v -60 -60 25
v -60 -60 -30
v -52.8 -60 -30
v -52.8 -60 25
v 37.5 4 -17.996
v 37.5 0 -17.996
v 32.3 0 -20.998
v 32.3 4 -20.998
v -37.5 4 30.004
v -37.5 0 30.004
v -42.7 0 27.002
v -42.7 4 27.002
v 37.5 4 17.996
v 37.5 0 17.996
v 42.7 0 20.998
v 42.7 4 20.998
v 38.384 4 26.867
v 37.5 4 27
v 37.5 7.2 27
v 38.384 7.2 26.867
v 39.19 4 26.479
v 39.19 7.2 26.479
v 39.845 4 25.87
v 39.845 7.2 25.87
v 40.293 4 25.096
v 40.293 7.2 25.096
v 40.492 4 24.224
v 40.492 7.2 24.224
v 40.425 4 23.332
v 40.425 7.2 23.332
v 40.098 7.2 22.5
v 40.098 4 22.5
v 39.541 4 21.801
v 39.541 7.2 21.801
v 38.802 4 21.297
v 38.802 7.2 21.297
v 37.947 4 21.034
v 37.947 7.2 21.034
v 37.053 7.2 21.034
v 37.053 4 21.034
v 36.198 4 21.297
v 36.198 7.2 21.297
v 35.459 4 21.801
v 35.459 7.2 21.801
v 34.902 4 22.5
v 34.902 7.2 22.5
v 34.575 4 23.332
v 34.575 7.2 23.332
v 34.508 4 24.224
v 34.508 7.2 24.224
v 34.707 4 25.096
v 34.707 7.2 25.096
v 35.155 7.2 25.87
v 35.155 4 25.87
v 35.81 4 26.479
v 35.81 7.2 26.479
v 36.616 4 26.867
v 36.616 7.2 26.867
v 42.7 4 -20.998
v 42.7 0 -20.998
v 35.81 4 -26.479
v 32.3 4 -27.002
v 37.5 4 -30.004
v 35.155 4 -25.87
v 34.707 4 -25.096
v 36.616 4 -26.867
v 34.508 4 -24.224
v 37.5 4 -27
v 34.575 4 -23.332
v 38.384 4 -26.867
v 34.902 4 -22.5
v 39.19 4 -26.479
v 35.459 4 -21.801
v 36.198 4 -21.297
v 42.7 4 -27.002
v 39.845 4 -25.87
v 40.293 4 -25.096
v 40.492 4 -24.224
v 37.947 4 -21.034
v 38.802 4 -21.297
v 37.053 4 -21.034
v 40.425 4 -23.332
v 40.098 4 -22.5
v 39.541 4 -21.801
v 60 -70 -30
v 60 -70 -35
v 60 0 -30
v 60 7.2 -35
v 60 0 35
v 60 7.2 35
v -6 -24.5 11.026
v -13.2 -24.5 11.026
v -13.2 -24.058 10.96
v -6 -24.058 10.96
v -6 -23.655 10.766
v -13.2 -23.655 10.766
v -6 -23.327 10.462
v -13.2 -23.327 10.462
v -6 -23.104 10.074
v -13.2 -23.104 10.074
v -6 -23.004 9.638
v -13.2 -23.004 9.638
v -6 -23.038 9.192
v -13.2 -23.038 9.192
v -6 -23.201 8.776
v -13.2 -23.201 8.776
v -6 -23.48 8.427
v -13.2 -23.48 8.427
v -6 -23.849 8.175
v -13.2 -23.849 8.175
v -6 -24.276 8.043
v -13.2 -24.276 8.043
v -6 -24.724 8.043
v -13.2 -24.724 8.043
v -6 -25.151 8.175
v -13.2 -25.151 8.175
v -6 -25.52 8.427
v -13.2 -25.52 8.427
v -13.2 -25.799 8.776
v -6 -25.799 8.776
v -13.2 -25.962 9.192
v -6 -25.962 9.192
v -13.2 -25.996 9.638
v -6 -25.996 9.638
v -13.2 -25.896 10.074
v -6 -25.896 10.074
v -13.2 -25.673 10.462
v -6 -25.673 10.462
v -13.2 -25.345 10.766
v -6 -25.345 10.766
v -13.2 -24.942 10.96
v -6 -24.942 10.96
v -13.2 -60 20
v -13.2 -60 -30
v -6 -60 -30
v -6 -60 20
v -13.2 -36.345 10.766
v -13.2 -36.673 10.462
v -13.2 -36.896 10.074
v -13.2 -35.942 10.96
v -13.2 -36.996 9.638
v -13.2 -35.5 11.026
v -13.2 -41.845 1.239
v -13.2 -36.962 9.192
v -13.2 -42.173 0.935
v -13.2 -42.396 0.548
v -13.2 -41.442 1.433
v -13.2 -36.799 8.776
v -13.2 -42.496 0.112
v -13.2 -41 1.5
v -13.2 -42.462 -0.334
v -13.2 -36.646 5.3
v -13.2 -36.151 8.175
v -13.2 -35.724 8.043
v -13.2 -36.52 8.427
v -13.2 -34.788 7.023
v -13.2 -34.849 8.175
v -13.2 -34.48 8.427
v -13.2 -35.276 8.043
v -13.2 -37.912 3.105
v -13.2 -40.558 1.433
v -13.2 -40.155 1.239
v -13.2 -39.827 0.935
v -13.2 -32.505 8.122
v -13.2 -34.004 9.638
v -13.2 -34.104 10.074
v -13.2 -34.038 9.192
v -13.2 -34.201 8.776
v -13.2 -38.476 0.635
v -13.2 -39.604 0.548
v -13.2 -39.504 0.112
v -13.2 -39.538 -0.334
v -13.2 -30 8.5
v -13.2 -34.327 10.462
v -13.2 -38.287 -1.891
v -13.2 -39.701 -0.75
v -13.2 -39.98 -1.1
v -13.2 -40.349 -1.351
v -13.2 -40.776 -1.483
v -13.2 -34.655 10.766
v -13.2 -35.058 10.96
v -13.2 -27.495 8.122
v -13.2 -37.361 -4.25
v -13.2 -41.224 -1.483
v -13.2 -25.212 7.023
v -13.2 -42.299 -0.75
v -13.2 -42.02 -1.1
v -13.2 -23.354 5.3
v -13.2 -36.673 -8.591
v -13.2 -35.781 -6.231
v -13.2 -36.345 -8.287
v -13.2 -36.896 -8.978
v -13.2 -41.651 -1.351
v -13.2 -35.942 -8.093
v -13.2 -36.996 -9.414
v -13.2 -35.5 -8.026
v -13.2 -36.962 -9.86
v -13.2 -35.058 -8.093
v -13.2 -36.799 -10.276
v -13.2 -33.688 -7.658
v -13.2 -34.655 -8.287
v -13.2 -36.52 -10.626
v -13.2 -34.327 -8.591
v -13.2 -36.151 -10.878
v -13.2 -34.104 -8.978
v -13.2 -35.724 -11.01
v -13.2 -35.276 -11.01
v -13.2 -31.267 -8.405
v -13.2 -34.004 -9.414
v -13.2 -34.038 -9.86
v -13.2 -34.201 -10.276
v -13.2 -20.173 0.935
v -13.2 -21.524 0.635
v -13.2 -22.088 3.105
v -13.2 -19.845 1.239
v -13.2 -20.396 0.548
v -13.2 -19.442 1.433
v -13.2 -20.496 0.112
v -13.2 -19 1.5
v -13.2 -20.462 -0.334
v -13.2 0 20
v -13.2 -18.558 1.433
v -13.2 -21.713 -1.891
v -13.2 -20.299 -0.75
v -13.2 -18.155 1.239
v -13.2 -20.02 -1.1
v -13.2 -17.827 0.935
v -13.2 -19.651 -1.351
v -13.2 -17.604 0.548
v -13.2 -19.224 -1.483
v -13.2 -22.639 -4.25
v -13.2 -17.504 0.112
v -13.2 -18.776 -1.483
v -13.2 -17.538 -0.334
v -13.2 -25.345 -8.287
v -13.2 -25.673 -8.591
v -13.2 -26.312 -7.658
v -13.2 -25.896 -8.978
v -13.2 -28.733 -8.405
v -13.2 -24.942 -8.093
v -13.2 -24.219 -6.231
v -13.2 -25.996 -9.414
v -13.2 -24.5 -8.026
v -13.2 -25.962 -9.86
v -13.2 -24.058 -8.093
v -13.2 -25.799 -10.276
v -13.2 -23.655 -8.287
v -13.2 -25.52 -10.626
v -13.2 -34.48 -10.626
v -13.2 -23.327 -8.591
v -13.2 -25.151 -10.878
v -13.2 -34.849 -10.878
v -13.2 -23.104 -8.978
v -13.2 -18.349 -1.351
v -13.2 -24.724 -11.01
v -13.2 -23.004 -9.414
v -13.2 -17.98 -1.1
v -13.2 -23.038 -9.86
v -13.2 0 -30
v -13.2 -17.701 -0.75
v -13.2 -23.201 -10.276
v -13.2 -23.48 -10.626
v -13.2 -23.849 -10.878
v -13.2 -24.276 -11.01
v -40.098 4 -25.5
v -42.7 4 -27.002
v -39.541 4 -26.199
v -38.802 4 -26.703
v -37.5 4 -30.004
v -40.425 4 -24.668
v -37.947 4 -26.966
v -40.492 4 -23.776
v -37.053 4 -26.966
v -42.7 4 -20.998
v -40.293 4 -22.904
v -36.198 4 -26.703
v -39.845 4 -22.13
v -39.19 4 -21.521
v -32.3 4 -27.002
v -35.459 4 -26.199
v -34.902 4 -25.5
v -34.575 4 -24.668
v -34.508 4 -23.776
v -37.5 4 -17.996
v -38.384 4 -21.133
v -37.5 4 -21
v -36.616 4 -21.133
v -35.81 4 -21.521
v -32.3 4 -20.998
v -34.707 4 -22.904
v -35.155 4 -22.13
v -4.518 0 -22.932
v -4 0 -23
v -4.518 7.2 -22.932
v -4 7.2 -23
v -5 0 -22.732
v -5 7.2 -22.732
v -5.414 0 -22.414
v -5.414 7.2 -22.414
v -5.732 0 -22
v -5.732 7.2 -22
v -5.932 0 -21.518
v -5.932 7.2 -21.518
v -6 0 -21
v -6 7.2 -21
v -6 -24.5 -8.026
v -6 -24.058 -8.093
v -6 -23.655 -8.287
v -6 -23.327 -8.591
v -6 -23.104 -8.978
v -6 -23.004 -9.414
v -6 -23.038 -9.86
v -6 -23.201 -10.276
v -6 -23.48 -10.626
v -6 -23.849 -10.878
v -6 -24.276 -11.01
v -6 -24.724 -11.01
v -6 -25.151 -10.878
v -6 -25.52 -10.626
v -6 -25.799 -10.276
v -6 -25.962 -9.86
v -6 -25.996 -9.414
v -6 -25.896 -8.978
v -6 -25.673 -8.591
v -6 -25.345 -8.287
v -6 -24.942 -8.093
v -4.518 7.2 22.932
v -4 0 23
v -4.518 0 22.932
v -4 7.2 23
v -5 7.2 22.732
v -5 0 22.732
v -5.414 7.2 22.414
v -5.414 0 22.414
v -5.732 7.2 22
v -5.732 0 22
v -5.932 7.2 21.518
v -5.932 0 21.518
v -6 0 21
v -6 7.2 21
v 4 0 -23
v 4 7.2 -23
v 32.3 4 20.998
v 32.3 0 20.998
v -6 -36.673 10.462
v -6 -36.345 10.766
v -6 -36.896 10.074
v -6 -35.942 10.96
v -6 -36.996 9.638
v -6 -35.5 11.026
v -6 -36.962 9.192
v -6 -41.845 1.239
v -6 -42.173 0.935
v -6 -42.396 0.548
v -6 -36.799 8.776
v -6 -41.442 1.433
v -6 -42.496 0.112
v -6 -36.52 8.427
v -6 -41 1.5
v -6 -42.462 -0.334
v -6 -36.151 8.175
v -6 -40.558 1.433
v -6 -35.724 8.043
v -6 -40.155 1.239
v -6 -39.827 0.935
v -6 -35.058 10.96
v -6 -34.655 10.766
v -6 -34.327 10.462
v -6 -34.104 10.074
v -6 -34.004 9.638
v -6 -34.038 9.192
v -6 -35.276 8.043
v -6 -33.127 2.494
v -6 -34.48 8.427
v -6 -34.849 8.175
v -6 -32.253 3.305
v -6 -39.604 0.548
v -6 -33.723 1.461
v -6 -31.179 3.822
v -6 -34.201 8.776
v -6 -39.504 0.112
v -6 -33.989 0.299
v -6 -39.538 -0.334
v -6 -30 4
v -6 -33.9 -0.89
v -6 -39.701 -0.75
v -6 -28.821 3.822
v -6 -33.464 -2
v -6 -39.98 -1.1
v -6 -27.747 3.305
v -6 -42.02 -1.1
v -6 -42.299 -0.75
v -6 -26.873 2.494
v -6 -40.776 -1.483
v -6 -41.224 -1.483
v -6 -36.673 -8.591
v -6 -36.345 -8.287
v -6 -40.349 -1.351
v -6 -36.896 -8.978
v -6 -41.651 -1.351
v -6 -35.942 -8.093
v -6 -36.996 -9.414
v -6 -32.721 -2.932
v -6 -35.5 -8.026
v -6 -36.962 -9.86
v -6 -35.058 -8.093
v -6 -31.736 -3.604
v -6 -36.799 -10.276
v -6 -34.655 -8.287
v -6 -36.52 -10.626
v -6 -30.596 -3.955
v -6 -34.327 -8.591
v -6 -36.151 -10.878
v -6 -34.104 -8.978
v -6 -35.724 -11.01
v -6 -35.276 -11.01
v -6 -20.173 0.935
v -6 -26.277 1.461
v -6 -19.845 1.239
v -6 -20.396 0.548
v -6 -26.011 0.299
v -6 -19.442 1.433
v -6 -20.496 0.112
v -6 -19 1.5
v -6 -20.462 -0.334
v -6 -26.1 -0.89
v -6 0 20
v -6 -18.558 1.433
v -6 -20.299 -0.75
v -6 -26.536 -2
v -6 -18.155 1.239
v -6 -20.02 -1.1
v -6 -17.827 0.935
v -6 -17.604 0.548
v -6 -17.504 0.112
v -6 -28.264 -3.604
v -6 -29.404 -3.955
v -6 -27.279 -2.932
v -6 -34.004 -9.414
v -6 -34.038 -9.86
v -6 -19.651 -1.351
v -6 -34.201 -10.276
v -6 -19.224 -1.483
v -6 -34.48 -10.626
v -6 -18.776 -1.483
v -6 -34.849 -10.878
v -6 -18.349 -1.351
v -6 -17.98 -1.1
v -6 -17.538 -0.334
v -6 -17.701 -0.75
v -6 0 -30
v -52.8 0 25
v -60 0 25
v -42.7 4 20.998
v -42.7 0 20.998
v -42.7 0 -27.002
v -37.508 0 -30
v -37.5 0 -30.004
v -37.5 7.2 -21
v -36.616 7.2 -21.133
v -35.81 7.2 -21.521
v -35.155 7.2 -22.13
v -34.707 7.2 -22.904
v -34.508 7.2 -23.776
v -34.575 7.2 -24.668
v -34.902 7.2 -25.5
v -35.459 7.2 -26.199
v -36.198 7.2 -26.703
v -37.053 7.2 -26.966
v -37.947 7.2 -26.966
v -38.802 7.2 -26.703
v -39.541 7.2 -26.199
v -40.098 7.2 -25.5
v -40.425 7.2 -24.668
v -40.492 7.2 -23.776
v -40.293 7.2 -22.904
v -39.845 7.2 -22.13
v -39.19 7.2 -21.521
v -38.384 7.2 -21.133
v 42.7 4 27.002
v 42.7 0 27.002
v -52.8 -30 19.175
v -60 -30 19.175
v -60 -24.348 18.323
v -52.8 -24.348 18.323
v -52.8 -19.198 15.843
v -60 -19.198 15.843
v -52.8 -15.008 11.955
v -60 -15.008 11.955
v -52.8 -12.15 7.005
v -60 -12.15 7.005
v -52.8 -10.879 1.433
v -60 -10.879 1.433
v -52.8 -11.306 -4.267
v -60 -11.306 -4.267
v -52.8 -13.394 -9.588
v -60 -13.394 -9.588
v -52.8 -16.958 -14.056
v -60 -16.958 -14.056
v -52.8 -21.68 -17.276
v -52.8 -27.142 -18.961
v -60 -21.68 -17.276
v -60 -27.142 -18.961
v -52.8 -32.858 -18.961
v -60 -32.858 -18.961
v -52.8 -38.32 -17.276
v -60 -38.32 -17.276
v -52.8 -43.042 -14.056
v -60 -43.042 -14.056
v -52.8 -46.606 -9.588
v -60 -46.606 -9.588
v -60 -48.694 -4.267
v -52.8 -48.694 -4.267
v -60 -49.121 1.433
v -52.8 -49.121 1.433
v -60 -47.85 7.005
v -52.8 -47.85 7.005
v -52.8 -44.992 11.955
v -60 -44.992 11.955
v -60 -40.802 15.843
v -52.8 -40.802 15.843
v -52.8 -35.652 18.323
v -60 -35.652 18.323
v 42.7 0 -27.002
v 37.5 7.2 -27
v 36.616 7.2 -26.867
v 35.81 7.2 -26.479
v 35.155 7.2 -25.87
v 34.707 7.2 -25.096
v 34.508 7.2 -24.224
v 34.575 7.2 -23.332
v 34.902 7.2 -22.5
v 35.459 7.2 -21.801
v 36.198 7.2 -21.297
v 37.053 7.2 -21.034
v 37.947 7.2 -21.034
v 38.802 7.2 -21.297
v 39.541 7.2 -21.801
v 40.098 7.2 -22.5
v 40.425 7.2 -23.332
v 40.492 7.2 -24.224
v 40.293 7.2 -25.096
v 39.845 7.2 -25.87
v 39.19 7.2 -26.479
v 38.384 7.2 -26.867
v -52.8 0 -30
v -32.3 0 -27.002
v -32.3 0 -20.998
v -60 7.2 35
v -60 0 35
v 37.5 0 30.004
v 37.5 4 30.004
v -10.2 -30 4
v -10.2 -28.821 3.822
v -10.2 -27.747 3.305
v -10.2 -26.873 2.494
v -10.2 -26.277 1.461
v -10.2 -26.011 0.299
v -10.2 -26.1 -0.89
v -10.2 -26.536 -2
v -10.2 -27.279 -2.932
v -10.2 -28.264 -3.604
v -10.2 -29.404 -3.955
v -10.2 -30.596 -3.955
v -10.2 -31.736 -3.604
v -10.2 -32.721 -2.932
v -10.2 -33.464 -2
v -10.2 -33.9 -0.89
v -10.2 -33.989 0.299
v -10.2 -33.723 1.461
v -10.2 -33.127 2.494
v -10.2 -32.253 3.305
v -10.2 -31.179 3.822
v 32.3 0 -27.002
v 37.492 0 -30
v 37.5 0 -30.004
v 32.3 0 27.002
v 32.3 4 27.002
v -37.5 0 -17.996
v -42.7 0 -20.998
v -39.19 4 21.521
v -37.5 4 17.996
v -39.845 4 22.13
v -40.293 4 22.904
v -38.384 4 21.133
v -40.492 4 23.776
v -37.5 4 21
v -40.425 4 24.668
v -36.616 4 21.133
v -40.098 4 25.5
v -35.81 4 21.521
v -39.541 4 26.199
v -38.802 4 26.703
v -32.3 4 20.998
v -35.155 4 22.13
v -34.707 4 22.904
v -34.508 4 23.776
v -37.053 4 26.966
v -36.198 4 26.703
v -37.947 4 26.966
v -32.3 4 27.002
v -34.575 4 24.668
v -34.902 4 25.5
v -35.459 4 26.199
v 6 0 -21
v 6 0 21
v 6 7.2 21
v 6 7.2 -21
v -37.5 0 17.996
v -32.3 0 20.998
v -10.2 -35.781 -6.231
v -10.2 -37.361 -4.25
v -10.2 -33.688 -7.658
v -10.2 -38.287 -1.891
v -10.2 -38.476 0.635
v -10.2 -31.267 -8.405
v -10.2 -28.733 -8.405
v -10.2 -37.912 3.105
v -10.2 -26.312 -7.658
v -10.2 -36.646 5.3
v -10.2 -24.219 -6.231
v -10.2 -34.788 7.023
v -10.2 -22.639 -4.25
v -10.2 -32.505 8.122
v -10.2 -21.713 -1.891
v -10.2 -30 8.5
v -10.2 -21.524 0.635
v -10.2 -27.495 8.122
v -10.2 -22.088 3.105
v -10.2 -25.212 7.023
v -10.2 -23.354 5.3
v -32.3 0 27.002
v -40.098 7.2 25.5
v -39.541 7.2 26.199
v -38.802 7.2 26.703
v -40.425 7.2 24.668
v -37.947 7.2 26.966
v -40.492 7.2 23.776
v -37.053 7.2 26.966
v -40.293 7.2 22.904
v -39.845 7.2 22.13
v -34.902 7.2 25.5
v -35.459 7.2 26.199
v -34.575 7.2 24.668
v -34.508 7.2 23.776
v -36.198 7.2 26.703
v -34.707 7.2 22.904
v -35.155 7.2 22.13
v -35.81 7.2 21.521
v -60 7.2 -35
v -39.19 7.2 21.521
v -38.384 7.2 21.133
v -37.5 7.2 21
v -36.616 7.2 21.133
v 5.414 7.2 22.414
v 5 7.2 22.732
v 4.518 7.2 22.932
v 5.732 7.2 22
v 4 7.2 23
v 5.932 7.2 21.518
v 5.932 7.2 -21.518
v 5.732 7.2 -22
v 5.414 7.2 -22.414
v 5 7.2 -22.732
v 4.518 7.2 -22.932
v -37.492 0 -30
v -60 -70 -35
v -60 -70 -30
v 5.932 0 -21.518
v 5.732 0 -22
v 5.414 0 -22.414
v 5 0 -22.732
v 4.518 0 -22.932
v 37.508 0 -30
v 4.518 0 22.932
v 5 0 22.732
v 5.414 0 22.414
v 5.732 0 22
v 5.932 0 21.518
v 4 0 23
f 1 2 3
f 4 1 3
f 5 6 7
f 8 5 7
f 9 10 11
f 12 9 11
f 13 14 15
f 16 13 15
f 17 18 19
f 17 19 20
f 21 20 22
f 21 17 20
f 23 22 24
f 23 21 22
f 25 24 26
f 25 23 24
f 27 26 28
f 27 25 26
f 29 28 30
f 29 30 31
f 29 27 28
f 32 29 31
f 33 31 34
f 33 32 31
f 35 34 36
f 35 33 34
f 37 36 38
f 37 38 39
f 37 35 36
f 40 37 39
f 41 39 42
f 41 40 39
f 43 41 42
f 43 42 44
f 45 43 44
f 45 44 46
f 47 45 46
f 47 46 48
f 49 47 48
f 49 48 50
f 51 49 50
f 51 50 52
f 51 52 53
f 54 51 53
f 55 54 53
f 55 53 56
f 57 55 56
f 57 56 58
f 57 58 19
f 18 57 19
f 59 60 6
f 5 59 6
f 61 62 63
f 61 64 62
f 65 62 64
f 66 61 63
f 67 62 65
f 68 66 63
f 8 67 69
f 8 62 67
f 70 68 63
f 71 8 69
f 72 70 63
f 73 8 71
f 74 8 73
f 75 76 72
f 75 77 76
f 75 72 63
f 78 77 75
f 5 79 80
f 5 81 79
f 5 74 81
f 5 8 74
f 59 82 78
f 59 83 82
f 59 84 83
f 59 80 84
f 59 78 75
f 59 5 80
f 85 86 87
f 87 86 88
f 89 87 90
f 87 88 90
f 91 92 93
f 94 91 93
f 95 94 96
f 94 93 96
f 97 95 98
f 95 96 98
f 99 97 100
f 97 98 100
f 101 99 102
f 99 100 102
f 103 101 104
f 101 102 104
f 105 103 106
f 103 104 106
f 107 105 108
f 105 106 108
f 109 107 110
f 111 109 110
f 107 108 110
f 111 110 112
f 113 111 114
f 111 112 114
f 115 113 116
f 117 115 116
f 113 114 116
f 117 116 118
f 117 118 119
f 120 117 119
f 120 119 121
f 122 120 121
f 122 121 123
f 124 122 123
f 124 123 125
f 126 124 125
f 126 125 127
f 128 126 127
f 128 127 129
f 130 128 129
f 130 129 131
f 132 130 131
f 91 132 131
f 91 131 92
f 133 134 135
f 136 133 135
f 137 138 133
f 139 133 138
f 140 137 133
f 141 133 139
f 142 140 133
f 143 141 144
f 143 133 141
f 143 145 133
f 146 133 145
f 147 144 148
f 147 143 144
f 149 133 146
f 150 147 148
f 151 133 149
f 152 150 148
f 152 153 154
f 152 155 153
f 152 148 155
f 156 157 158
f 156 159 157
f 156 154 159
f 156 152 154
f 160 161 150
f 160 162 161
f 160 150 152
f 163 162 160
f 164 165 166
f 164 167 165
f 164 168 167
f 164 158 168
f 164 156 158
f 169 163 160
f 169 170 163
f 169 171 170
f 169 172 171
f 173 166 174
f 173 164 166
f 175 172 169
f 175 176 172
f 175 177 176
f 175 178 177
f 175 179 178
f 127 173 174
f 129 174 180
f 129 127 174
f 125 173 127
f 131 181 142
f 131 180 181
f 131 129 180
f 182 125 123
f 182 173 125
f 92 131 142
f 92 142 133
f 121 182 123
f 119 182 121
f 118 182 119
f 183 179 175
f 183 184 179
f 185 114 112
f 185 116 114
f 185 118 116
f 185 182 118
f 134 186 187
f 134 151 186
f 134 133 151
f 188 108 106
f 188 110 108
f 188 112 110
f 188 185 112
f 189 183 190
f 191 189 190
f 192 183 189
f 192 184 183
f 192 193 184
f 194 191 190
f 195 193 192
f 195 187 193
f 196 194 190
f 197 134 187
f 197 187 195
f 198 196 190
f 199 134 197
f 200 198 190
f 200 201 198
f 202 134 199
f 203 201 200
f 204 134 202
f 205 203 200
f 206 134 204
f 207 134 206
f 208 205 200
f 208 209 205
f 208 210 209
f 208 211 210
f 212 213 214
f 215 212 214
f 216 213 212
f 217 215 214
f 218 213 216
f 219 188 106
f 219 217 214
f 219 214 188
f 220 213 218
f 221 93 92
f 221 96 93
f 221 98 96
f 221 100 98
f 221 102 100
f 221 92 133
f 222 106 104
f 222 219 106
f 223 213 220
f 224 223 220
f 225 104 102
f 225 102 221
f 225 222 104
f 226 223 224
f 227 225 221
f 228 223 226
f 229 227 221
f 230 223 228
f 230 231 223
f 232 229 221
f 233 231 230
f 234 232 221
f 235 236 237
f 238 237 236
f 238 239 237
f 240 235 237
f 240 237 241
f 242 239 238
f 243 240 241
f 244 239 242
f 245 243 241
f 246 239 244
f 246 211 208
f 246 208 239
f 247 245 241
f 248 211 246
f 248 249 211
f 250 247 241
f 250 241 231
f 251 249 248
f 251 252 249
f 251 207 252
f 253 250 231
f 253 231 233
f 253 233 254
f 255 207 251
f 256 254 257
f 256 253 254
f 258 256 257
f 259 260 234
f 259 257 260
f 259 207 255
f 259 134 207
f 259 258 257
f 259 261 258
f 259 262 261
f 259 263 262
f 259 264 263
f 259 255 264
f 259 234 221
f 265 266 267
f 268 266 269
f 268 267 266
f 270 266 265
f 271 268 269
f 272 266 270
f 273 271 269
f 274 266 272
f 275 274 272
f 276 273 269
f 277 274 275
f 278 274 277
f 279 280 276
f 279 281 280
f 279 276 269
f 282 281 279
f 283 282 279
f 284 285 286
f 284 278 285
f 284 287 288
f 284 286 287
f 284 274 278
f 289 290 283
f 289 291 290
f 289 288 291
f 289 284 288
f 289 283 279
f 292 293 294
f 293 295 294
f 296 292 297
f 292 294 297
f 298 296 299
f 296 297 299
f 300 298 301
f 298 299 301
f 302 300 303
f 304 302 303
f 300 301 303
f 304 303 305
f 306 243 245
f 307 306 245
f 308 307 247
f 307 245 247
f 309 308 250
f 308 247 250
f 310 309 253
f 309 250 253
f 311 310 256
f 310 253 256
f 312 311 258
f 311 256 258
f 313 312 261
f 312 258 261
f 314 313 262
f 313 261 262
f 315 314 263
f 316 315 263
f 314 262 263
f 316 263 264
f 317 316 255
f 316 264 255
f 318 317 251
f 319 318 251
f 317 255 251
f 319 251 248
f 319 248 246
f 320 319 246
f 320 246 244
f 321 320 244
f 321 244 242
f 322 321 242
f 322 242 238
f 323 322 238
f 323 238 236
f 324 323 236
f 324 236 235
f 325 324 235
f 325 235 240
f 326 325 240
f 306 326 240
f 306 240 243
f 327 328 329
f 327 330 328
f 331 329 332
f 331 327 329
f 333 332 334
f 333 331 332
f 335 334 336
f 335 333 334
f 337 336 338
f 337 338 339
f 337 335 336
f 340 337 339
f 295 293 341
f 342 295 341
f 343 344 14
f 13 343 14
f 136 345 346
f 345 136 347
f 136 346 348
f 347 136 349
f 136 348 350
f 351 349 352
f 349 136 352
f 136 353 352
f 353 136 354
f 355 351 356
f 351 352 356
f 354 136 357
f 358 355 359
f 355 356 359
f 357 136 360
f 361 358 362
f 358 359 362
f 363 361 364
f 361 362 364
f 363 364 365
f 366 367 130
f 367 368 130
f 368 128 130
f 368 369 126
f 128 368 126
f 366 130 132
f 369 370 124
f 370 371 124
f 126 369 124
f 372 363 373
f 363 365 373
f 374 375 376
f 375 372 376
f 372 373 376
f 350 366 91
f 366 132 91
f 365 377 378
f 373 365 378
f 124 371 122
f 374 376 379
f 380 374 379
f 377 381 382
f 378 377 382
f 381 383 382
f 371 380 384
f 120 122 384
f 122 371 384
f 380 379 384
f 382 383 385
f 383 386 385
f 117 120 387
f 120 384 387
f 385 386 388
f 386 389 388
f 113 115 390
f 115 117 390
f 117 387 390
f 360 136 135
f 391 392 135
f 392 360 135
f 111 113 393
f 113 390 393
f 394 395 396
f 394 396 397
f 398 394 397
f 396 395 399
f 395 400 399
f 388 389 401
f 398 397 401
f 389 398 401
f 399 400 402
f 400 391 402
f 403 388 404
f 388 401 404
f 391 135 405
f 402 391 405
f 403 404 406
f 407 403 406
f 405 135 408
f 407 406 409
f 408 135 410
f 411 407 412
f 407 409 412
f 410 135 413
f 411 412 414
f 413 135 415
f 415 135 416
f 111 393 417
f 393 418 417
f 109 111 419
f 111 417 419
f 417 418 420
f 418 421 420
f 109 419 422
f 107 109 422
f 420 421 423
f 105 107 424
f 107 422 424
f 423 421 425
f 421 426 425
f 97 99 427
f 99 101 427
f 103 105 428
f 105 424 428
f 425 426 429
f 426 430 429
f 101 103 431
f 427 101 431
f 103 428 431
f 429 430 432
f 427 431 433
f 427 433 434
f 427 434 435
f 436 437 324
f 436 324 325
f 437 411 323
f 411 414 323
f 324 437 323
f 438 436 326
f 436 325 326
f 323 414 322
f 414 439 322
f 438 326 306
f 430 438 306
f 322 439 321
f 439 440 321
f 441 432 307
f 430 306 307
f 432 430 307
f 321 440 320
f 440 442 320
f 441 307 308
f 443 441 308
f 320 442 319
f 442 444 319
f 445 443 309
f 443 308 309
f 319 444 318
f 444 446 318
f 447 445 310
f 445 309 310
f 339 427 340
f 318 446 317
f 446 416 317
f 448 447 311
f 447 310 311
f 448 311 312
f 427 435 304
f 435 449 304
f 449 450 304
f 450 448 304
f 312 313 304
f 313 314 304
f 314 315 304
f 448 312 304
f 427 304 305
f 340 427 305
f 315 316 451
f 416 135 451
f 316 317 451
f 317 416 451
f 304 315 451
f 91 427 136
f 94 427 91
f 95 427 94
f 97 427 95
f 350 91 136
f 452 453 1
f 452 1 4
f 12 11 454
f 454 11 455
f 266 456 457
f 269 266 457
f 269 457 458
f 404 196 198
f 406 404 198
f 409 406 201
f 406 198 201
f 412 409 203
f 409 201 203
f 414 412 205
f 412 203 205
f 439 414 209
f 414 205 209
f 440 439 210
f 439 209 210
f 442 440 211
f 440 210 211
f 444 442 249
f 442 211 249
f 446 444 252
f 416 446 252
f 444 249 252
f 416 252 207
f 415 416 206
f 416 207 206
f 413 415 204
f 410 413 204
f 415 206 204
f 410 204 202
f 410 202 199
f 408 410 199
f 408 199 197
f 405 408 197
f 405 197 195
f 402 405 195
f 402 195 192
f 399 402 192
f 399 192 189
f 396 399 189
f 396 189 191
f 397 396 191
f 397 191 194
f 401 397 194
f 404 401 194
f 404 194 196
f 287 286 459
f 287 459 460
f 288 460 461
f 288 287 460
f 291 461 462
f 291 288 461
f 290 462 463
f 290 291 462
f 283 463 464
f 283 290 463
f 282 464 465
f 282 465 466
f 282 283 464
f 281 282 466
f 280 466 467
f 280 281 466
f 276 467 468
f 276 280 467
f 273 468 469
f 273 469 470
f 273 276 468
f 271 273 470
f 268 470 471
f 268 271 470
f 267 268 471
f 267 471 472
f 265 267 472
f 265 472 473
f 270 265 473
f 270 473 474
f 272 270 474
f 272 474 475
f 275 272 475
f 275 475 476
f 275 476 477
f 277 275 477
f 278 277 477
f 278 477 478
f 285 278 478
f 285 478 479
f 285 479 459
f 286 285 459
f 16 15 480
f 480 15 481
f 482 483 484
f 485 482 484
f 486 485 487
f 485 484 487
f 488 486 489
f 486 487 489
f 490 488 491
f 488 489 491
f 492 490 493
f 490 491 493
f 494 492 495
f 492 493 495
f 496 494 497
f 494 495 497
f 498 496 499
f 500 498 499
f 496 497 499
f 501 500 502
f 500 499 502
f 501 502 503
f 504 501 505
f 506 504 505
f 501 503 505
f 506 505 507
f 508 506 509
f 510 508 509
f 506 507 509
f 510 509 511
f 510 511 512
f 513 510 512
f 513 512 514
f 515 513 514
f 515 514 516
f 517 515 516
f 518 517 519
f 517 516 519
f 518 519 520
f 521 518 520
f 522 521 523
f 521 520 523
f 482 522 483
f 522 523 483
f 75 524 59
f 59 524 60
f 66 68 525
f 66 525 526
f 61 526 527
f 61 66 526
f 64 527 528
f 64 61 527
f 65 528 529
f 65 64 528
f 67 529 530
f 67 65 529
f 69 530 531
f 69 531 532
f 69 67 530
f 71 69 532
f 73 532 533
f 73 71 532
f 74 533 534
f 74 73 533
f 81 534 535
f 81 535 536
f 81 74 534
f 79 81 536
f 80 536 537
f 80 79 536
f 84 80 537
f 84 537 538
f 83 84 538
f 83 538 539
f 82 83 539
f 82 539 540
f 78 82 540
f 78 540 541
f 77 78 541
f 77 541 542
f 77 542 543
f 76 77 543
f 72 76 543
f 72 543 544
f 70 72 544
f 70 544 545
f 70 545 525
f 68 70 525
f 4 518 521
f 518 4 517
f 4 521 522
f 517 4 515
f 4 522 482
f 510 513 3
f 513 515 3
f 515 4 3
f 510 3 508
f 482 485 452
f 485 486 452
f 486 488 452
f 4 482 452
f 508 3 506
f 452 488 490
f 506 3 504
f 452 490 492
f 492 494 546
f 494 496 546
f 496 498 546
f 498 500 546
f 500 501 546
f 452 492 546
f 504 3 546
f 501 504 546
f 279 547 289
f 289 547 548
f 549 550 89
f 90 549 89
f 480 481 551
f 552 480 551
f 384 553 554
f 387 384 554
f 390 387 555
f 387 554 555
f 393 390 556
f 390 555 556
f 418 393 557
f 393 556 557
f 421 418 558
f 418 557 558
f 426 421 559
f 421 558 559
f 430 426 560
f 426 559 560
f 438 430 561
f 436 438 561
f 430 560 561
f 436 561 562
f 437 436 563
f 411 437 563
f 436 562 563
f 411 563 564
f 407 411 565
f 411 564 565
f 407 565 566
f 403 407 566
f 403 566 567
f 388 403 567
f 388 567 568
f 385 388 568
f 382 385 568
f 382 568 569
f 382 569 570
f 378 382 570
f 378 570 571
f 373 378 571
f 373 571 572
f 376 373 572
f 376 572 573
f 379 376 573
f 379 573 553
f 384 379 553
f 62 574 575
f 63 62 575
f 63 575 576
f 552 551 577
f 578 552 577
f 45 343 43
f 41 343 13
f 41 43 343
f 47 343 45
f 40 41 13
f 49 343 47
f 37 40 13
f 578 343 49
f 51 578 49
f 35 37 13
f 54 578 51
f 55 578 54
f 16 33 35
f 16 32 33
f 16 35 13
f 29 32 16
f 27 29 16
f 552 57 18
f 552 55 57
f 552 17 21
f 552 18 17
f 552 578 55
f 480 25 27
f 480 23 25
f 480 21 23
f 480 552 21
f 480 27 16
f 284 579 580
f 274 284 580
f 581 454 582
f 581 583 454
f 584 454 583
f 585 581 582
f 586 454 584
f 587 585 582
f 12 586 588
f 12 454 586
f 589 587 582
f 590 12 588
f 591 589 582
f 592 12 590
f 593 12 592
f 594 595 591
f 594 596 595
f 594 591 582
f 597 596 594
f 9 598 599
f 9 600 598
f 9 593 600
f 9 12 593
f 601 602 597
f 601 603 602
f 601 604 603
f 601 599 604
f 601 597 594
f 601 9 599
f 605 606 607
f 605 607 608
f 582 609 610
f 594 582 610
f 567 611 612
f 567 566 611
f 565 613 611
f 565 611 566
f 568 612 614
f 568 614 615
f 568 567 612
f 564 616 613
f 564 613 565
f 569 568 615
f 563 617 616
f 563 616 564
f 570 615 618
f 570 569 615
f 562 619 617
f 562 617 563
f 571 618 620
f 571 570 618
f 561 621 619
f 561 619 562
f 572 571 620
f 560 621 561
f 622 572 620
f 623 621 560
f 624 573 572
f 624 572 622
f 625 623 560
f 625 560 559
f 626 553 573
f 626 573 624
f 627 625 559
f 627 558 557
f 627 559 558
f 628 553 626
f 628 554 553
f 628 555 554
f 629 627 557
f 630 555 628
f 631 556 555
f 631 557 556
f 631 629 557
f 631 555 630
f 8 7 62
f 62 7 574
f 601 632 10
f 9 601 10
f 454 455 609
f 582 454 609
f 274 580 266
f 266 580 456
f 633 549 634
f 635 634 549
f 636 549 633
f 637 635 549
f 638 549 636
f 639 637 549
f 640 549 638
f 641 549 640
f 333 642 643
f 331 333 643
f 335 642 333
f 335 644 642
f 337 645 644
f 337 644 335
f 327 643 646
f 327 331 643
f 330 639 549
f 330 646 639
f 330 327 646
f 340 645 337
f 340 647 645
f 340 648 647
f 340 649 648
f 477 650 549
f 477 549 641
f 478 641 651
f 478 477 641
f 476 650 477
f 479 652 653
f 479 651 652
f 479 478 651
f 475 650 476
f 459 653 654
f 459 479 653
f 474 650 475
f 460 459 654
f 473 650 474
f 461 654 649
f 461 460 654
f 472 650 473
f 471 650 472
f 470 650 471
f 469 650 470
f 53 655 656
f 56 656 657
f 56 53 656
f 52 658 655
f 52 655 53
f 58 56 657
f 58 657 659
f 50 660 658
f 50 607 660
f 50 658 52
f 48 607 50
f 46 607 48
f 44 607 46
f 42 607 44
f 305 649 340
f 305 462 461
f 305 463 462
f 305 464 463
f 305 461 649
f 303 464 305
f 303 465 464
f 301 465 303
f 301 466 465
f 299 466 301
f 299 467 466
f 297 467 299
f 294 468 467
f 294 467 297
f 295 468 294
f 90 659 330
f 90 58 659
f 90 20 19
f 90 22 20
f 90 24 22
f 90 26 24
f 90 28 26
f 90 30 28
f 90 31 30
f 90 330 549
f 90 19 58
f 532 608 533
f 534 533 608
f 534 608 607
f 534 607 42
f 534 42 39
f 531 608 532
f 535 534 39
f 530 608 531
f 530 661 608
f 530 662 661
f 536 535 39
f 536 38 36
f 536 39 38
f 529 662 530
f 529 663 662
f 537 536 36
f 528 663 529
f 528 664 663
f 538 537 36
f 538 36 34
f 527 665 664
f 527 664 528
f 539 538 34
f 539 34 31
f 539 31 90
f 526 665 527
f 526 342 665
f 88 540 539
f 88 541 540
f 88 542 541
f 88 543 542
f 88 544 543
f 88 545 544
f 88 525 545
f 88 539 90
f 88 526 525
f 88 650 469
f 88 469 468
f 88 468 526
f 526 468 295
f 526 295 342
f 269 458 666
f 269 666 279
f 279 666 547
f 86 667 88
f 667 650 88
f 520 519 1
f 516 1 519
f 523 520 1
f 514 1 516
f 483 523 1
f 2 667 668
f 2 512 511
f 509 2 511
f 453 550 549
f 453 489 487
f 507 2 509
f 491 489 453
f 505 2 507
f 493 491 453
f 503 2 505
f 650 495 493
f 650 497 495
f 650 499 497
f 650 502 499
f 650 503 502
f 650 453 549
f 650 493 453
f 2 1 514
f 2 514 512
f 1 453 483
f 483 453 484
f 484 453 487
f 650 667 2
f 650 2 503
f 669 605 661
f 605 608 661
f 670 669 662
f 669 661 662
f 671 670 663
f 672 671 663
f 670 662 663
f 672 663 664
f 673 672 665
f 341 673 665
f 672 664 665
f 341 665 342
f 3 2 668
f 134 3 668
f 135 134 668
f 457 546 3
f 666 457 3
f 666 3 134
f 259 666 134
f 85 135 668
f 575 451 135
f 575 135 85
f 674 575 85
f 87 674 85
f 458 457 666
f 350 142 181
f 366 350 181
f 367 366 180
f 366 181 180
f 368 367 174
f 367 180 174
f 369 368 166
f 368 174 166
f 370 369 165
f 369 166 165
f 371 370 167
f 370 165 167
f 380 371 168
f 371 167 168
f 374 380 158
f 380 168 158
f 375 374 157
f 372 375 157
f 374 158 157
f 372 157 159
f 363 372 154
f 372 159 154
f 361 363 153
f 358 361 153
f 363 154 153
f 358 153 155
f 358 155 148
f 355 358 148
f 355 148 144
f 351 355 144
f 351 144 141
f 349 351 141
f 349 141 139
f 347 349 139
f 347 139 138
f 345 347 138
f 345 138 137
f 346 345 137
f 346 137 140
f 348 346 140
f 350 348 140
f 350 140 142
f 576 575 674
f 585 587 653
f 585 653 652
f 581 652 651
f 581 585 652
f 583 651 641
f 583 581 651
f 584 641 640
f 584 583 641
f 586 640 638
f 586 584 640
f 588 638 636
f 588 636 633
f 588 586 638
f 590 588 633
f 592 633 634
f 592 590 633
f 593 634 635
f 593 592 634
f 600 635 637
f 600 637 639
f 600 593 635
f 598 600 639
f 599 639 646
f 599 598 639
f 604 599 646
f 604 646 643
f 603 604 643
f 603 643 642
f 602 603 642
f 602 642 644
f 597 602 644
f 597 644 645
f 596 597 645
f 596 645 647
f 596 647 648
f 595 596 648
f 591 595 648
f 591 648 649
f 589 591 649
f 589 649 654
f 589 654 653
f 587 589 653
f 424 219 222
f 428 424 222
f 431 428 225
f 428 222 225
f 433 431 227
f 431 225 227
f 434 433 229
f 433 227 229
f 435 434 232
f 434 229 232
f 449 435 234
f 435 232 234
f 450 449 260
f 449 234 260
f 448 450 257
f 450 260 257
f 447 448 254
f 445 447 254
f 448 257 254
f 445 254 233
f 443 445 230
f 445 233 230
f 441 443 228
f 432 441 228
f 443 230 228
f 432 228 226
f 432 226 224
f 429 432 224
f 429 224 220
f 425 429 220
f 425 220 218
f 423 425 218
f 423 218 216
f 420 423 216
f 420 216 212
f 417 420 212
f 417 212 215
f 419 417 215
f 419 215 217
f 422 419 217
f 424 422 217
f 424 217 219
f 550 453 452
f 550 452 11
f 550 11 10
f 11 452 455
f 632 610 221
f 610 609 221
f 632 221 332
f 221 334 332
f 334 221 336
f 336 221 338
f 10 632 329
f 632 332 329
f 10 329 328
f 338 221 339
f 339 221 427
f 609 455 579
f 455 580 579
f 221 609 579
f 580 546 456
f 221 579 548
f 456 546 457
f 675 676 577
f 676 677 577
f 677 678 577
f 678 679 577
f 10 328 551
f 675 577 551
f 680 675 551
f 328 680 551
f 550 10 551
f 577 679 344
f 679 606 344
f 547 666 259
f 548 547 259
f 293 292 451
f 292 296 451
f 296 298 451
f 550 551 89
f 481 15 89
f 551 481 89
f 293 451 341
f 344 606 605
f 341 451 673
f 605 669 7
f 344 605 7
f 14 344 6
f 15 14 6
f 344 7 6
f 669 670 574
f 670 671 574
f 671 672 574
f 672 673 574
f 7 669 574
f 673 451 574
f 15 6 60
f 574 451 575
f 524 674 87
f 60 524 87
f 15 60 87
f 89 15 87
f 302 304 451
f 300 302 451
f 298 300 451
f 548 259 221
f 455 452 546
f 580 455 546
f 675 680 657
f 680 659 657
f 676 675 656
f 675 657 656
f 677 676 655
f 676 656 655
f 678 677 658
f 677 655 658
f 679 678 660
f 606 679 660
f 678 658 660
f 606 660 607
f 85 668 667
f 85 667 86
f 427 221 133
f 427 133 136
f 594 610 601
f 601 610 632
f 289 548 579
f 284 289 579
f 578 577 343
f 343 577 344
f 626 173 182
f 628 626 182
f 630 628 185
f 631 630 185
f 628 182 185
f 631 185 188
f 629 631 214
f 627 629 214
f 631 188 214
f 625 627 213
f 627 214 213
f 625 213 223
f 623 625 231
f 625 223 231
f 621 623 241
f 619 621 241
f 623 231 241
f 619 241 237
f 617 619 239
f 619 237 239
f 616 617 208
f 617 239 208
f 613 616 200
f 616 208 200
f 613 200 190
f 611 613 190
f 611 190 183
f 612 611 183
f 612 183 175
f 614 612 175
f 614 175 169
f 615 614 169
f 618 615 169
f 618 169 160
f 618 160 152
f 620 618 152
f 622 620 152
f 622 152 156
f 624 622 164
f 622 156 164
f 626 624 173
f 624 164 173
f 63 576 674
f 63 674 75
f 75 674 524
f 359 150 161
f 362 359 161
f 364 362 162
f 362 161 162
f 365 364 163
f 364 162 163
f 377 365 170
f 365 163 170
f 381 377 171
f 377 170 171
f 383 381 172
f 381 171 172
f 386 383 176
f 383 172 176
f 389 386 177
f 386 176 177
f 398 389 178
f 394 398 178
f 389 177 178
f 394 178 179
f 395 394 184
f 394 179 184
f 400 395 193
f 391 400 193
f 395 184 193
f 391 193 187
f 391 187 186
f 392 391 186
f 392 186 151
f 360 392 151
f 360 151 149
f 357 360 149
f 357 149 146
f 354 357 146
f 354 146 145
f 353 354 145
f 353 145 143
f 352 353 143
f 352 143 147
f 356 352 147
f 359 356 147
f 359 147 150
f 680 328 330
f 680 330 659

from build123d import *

# Parameters (mm, degrees)
SKETCH1_W           = 120
SKETCH1_H           = 70
SKETCH1_R           = 3
SKETCH1_W_2         = 12
SKETCH1_H_2         = 46
BOSS_EXTRUDE1_DEPTH = 7.2
FILLET1_R           = 2
SKETCH2_W           = 120
SKETCH2_H           = 5
BOSS_EXTRUDE2_DEPTH = 70
SKETCH3_W           = 7.2
SKETCH3_H           = 60
BOSS_EXTRUDE3_DEPTH = 50
SKETCH4_R           = 4
SKETCH4_R_2         = 1.5
CUT_EXTRUDE1_DEPTH  = 10
SKETCH5_R           = 8.5
CUT_EXTRUDE2_DEPTH  = 3
SKETCH6_W           = 7.2
SKETCH6_H           = 60
BOSS_EXTRUDE4_DEPTH = 55
CUT_EXTRUDE4_DEPTH  = 4
CUT_EXTRUDE5_START  = -60
SKETCH10_R          = 4
CUT_EXTRUDE5_DEPTH  = 60
SKETCH11_R          = 19.175
CUT_EXTRUDE6_DEPTH  = 7.2


with BuildPart() as part:
    # Sketch1 → Boss-Extrude1 (new body)
    with BuildSketch(Plane(origin=(0, 0, 0), x_dir=(1, 0, 0), z_dir=(0, 1, 0))):
        Rectangle(SKETCH1_W, SKETCH1_H)
        with Locations(Location((-37.5, 24, 0), (0, 0, 270))):
            Circle(SKETCH1_R, mode=Mode.SUBTRACT)
        with Locations(Location((-37.5, -24, 0), (0, 0, 90))):
            Circle(SKETCH1_R, mode=Mode.SUBTRACT)
        with Locations(Location((37.5, 24, 0), (0, 0, 90))):
            Circle(SKETCH1_R, mode=Mode.SUBTRACT)
        with Locations(Location((37.5, -24, 0), (0, 0, 270))):
            Circle(SKETCH1_R, mode=Mode.SUBTRACT)
        Rectangle(SKETCH1_W_2, SKETCH1_H_2, mode=Mode.SUBTRACT)
    extrude(amount=BOSS_EXTRUDE1_DEPTH)

    # Fillet1
    fillet1_edges = [part.edges().sort_by_distance(p)[0] for p in [
        (-6, 3.6, -23),
        (-6, 3.6, 23),
        (6, 3.6, 23),
        (6, 3.6, -23),
    ]]
    fillet(fillet1_edges, radius=FILLET1_R)

    # Sketch2 → Boss-Extrude2 (add)
    with BuildSketch(Plane.XZ):
        with Locations((0, -32.5)):
            Rectangle(SKETCH2_W, SKETCH2_H)
    extrude(amount=BOSS_EXTRUDE2_DEPTH)

    # Sketch3 → Boss-Extrude3 (add)
    with BuildSketch(Plane.XY.offset(-30)):
        with Locations((-9.6, -30)):
            Rectangle(SKETCH3_W, SKETCH3_H)
    extrude(amount=BOSS_EXTRUDE3_DEPTH)

    # Sketch4 → Cut-Extrude1 (cut)
    with BuildSketch(Plane.ZY.offset(13.2)):
        with Locations((0, -30)):
            Circle(SKETCH4_R)
        with Locations((0, -19)):
            Circle(SKETCH4_R_2)
        with Locations((-9.526279442, -24.5)):
            Circle(SKETCH4_R_2)
        with Locations((-9.526279442, -35.5)):
            Circle(SKETCH4_R_2)
        with Locations((0, -41)):
            Circle(SKETCH4_R_2)
        with Locations((9.526279442, -35.5)):
            Circle(SKETCH4_R_2)
        with Locations((9.526279442, -24.5)):
            Circle(SKETCH4_R_2)
    extrude(amount=-CUT_EXTRUDE1_DEPTH, mode=Mode.SUBTRACT)

    # Sketch5 → Cut-Extrude2 (cut)
    with BuildSketch(Plane.ZY.offset(13.2)):
        with Locations((0, -30)):
            Circle(SKETCH5_R)
    extrude(amount=-CUT_EXTRUDE2_DEPTH, mode=Mode.SUBTRACT)

    # Sketch6 → Boss-Extrude4 (add)
    with BuildSketch(Plane.XY.offset(-30)):
        with Locations((-56.4, -30)):
            Rectangle(SKETCH6_W, SKETCH6_H)
    extrude(amount=BOSS_EXTRUDE4_DEPTH)

    # Sketch8 → Cut-Extrude4 (cut)
    with BuildSketch(Plane.XZ):
        Polygon((42.7, 27.0022214), (37.5, 30.0044428), (32.3, 27.0022214), (32.3, 20.9977786), (37.5, 17.9955572), (42.7, 20.9977786), align=None)
        Polygon((-32.3, 27.0022214), (-37.5, 30.0044428), (-42.7, 27.0022214), (-42.7, 20.9977786), (-37.5, 17.9955572), (-32.3, 20.9977786), align=None)
        Polygon((42.7, -20.9977786), (37.5, -17.9955572), (32.3, -20.9977786), (32.3, -27.0022214), (37.5, -30.0044428), (42.7, -27.0022214), align=None)
        Polygon((-32.3, -20.9977786), (-37.5, -17.9955572), (-42.7, -20.9977786), (-42.7, -27.0022214), (-37.5, -30.0044428), (-32.3, -27.0022214), align=None)
    extrude(amount=-CUT_EXTRUDE4_DEPTH, mode=Mode.SUBTRACT)

    # Sketch10 → Cut-Extrude5 (cut)
    with BuildSketch(Plane(origin=(-6, 0, 0), x_dir=(0, 0, -1), z_dir=(1, 0, 0)).offset(CUT_EXTRUDE5_START)):
        with Locations(Location((0, -30, 0), (0, 0, 180))):
            Circle(SKETCH10_R)
    extrude(amount=CUT_EXTRUDE5_DEPTH, mode=Mode.SUBTRACT)

    # Sketch11 → Cut-Extrude6 (cut)
    with BuildSketch(Plane.ZY.offset(60)):
        with Locations((0, -30)):
            Circle(SKETCH11_R)
    extrude(amount=-CUT_EXTRUDE6_DEPTH, mode=Mode.SUBTRACT)


solid = part.part
